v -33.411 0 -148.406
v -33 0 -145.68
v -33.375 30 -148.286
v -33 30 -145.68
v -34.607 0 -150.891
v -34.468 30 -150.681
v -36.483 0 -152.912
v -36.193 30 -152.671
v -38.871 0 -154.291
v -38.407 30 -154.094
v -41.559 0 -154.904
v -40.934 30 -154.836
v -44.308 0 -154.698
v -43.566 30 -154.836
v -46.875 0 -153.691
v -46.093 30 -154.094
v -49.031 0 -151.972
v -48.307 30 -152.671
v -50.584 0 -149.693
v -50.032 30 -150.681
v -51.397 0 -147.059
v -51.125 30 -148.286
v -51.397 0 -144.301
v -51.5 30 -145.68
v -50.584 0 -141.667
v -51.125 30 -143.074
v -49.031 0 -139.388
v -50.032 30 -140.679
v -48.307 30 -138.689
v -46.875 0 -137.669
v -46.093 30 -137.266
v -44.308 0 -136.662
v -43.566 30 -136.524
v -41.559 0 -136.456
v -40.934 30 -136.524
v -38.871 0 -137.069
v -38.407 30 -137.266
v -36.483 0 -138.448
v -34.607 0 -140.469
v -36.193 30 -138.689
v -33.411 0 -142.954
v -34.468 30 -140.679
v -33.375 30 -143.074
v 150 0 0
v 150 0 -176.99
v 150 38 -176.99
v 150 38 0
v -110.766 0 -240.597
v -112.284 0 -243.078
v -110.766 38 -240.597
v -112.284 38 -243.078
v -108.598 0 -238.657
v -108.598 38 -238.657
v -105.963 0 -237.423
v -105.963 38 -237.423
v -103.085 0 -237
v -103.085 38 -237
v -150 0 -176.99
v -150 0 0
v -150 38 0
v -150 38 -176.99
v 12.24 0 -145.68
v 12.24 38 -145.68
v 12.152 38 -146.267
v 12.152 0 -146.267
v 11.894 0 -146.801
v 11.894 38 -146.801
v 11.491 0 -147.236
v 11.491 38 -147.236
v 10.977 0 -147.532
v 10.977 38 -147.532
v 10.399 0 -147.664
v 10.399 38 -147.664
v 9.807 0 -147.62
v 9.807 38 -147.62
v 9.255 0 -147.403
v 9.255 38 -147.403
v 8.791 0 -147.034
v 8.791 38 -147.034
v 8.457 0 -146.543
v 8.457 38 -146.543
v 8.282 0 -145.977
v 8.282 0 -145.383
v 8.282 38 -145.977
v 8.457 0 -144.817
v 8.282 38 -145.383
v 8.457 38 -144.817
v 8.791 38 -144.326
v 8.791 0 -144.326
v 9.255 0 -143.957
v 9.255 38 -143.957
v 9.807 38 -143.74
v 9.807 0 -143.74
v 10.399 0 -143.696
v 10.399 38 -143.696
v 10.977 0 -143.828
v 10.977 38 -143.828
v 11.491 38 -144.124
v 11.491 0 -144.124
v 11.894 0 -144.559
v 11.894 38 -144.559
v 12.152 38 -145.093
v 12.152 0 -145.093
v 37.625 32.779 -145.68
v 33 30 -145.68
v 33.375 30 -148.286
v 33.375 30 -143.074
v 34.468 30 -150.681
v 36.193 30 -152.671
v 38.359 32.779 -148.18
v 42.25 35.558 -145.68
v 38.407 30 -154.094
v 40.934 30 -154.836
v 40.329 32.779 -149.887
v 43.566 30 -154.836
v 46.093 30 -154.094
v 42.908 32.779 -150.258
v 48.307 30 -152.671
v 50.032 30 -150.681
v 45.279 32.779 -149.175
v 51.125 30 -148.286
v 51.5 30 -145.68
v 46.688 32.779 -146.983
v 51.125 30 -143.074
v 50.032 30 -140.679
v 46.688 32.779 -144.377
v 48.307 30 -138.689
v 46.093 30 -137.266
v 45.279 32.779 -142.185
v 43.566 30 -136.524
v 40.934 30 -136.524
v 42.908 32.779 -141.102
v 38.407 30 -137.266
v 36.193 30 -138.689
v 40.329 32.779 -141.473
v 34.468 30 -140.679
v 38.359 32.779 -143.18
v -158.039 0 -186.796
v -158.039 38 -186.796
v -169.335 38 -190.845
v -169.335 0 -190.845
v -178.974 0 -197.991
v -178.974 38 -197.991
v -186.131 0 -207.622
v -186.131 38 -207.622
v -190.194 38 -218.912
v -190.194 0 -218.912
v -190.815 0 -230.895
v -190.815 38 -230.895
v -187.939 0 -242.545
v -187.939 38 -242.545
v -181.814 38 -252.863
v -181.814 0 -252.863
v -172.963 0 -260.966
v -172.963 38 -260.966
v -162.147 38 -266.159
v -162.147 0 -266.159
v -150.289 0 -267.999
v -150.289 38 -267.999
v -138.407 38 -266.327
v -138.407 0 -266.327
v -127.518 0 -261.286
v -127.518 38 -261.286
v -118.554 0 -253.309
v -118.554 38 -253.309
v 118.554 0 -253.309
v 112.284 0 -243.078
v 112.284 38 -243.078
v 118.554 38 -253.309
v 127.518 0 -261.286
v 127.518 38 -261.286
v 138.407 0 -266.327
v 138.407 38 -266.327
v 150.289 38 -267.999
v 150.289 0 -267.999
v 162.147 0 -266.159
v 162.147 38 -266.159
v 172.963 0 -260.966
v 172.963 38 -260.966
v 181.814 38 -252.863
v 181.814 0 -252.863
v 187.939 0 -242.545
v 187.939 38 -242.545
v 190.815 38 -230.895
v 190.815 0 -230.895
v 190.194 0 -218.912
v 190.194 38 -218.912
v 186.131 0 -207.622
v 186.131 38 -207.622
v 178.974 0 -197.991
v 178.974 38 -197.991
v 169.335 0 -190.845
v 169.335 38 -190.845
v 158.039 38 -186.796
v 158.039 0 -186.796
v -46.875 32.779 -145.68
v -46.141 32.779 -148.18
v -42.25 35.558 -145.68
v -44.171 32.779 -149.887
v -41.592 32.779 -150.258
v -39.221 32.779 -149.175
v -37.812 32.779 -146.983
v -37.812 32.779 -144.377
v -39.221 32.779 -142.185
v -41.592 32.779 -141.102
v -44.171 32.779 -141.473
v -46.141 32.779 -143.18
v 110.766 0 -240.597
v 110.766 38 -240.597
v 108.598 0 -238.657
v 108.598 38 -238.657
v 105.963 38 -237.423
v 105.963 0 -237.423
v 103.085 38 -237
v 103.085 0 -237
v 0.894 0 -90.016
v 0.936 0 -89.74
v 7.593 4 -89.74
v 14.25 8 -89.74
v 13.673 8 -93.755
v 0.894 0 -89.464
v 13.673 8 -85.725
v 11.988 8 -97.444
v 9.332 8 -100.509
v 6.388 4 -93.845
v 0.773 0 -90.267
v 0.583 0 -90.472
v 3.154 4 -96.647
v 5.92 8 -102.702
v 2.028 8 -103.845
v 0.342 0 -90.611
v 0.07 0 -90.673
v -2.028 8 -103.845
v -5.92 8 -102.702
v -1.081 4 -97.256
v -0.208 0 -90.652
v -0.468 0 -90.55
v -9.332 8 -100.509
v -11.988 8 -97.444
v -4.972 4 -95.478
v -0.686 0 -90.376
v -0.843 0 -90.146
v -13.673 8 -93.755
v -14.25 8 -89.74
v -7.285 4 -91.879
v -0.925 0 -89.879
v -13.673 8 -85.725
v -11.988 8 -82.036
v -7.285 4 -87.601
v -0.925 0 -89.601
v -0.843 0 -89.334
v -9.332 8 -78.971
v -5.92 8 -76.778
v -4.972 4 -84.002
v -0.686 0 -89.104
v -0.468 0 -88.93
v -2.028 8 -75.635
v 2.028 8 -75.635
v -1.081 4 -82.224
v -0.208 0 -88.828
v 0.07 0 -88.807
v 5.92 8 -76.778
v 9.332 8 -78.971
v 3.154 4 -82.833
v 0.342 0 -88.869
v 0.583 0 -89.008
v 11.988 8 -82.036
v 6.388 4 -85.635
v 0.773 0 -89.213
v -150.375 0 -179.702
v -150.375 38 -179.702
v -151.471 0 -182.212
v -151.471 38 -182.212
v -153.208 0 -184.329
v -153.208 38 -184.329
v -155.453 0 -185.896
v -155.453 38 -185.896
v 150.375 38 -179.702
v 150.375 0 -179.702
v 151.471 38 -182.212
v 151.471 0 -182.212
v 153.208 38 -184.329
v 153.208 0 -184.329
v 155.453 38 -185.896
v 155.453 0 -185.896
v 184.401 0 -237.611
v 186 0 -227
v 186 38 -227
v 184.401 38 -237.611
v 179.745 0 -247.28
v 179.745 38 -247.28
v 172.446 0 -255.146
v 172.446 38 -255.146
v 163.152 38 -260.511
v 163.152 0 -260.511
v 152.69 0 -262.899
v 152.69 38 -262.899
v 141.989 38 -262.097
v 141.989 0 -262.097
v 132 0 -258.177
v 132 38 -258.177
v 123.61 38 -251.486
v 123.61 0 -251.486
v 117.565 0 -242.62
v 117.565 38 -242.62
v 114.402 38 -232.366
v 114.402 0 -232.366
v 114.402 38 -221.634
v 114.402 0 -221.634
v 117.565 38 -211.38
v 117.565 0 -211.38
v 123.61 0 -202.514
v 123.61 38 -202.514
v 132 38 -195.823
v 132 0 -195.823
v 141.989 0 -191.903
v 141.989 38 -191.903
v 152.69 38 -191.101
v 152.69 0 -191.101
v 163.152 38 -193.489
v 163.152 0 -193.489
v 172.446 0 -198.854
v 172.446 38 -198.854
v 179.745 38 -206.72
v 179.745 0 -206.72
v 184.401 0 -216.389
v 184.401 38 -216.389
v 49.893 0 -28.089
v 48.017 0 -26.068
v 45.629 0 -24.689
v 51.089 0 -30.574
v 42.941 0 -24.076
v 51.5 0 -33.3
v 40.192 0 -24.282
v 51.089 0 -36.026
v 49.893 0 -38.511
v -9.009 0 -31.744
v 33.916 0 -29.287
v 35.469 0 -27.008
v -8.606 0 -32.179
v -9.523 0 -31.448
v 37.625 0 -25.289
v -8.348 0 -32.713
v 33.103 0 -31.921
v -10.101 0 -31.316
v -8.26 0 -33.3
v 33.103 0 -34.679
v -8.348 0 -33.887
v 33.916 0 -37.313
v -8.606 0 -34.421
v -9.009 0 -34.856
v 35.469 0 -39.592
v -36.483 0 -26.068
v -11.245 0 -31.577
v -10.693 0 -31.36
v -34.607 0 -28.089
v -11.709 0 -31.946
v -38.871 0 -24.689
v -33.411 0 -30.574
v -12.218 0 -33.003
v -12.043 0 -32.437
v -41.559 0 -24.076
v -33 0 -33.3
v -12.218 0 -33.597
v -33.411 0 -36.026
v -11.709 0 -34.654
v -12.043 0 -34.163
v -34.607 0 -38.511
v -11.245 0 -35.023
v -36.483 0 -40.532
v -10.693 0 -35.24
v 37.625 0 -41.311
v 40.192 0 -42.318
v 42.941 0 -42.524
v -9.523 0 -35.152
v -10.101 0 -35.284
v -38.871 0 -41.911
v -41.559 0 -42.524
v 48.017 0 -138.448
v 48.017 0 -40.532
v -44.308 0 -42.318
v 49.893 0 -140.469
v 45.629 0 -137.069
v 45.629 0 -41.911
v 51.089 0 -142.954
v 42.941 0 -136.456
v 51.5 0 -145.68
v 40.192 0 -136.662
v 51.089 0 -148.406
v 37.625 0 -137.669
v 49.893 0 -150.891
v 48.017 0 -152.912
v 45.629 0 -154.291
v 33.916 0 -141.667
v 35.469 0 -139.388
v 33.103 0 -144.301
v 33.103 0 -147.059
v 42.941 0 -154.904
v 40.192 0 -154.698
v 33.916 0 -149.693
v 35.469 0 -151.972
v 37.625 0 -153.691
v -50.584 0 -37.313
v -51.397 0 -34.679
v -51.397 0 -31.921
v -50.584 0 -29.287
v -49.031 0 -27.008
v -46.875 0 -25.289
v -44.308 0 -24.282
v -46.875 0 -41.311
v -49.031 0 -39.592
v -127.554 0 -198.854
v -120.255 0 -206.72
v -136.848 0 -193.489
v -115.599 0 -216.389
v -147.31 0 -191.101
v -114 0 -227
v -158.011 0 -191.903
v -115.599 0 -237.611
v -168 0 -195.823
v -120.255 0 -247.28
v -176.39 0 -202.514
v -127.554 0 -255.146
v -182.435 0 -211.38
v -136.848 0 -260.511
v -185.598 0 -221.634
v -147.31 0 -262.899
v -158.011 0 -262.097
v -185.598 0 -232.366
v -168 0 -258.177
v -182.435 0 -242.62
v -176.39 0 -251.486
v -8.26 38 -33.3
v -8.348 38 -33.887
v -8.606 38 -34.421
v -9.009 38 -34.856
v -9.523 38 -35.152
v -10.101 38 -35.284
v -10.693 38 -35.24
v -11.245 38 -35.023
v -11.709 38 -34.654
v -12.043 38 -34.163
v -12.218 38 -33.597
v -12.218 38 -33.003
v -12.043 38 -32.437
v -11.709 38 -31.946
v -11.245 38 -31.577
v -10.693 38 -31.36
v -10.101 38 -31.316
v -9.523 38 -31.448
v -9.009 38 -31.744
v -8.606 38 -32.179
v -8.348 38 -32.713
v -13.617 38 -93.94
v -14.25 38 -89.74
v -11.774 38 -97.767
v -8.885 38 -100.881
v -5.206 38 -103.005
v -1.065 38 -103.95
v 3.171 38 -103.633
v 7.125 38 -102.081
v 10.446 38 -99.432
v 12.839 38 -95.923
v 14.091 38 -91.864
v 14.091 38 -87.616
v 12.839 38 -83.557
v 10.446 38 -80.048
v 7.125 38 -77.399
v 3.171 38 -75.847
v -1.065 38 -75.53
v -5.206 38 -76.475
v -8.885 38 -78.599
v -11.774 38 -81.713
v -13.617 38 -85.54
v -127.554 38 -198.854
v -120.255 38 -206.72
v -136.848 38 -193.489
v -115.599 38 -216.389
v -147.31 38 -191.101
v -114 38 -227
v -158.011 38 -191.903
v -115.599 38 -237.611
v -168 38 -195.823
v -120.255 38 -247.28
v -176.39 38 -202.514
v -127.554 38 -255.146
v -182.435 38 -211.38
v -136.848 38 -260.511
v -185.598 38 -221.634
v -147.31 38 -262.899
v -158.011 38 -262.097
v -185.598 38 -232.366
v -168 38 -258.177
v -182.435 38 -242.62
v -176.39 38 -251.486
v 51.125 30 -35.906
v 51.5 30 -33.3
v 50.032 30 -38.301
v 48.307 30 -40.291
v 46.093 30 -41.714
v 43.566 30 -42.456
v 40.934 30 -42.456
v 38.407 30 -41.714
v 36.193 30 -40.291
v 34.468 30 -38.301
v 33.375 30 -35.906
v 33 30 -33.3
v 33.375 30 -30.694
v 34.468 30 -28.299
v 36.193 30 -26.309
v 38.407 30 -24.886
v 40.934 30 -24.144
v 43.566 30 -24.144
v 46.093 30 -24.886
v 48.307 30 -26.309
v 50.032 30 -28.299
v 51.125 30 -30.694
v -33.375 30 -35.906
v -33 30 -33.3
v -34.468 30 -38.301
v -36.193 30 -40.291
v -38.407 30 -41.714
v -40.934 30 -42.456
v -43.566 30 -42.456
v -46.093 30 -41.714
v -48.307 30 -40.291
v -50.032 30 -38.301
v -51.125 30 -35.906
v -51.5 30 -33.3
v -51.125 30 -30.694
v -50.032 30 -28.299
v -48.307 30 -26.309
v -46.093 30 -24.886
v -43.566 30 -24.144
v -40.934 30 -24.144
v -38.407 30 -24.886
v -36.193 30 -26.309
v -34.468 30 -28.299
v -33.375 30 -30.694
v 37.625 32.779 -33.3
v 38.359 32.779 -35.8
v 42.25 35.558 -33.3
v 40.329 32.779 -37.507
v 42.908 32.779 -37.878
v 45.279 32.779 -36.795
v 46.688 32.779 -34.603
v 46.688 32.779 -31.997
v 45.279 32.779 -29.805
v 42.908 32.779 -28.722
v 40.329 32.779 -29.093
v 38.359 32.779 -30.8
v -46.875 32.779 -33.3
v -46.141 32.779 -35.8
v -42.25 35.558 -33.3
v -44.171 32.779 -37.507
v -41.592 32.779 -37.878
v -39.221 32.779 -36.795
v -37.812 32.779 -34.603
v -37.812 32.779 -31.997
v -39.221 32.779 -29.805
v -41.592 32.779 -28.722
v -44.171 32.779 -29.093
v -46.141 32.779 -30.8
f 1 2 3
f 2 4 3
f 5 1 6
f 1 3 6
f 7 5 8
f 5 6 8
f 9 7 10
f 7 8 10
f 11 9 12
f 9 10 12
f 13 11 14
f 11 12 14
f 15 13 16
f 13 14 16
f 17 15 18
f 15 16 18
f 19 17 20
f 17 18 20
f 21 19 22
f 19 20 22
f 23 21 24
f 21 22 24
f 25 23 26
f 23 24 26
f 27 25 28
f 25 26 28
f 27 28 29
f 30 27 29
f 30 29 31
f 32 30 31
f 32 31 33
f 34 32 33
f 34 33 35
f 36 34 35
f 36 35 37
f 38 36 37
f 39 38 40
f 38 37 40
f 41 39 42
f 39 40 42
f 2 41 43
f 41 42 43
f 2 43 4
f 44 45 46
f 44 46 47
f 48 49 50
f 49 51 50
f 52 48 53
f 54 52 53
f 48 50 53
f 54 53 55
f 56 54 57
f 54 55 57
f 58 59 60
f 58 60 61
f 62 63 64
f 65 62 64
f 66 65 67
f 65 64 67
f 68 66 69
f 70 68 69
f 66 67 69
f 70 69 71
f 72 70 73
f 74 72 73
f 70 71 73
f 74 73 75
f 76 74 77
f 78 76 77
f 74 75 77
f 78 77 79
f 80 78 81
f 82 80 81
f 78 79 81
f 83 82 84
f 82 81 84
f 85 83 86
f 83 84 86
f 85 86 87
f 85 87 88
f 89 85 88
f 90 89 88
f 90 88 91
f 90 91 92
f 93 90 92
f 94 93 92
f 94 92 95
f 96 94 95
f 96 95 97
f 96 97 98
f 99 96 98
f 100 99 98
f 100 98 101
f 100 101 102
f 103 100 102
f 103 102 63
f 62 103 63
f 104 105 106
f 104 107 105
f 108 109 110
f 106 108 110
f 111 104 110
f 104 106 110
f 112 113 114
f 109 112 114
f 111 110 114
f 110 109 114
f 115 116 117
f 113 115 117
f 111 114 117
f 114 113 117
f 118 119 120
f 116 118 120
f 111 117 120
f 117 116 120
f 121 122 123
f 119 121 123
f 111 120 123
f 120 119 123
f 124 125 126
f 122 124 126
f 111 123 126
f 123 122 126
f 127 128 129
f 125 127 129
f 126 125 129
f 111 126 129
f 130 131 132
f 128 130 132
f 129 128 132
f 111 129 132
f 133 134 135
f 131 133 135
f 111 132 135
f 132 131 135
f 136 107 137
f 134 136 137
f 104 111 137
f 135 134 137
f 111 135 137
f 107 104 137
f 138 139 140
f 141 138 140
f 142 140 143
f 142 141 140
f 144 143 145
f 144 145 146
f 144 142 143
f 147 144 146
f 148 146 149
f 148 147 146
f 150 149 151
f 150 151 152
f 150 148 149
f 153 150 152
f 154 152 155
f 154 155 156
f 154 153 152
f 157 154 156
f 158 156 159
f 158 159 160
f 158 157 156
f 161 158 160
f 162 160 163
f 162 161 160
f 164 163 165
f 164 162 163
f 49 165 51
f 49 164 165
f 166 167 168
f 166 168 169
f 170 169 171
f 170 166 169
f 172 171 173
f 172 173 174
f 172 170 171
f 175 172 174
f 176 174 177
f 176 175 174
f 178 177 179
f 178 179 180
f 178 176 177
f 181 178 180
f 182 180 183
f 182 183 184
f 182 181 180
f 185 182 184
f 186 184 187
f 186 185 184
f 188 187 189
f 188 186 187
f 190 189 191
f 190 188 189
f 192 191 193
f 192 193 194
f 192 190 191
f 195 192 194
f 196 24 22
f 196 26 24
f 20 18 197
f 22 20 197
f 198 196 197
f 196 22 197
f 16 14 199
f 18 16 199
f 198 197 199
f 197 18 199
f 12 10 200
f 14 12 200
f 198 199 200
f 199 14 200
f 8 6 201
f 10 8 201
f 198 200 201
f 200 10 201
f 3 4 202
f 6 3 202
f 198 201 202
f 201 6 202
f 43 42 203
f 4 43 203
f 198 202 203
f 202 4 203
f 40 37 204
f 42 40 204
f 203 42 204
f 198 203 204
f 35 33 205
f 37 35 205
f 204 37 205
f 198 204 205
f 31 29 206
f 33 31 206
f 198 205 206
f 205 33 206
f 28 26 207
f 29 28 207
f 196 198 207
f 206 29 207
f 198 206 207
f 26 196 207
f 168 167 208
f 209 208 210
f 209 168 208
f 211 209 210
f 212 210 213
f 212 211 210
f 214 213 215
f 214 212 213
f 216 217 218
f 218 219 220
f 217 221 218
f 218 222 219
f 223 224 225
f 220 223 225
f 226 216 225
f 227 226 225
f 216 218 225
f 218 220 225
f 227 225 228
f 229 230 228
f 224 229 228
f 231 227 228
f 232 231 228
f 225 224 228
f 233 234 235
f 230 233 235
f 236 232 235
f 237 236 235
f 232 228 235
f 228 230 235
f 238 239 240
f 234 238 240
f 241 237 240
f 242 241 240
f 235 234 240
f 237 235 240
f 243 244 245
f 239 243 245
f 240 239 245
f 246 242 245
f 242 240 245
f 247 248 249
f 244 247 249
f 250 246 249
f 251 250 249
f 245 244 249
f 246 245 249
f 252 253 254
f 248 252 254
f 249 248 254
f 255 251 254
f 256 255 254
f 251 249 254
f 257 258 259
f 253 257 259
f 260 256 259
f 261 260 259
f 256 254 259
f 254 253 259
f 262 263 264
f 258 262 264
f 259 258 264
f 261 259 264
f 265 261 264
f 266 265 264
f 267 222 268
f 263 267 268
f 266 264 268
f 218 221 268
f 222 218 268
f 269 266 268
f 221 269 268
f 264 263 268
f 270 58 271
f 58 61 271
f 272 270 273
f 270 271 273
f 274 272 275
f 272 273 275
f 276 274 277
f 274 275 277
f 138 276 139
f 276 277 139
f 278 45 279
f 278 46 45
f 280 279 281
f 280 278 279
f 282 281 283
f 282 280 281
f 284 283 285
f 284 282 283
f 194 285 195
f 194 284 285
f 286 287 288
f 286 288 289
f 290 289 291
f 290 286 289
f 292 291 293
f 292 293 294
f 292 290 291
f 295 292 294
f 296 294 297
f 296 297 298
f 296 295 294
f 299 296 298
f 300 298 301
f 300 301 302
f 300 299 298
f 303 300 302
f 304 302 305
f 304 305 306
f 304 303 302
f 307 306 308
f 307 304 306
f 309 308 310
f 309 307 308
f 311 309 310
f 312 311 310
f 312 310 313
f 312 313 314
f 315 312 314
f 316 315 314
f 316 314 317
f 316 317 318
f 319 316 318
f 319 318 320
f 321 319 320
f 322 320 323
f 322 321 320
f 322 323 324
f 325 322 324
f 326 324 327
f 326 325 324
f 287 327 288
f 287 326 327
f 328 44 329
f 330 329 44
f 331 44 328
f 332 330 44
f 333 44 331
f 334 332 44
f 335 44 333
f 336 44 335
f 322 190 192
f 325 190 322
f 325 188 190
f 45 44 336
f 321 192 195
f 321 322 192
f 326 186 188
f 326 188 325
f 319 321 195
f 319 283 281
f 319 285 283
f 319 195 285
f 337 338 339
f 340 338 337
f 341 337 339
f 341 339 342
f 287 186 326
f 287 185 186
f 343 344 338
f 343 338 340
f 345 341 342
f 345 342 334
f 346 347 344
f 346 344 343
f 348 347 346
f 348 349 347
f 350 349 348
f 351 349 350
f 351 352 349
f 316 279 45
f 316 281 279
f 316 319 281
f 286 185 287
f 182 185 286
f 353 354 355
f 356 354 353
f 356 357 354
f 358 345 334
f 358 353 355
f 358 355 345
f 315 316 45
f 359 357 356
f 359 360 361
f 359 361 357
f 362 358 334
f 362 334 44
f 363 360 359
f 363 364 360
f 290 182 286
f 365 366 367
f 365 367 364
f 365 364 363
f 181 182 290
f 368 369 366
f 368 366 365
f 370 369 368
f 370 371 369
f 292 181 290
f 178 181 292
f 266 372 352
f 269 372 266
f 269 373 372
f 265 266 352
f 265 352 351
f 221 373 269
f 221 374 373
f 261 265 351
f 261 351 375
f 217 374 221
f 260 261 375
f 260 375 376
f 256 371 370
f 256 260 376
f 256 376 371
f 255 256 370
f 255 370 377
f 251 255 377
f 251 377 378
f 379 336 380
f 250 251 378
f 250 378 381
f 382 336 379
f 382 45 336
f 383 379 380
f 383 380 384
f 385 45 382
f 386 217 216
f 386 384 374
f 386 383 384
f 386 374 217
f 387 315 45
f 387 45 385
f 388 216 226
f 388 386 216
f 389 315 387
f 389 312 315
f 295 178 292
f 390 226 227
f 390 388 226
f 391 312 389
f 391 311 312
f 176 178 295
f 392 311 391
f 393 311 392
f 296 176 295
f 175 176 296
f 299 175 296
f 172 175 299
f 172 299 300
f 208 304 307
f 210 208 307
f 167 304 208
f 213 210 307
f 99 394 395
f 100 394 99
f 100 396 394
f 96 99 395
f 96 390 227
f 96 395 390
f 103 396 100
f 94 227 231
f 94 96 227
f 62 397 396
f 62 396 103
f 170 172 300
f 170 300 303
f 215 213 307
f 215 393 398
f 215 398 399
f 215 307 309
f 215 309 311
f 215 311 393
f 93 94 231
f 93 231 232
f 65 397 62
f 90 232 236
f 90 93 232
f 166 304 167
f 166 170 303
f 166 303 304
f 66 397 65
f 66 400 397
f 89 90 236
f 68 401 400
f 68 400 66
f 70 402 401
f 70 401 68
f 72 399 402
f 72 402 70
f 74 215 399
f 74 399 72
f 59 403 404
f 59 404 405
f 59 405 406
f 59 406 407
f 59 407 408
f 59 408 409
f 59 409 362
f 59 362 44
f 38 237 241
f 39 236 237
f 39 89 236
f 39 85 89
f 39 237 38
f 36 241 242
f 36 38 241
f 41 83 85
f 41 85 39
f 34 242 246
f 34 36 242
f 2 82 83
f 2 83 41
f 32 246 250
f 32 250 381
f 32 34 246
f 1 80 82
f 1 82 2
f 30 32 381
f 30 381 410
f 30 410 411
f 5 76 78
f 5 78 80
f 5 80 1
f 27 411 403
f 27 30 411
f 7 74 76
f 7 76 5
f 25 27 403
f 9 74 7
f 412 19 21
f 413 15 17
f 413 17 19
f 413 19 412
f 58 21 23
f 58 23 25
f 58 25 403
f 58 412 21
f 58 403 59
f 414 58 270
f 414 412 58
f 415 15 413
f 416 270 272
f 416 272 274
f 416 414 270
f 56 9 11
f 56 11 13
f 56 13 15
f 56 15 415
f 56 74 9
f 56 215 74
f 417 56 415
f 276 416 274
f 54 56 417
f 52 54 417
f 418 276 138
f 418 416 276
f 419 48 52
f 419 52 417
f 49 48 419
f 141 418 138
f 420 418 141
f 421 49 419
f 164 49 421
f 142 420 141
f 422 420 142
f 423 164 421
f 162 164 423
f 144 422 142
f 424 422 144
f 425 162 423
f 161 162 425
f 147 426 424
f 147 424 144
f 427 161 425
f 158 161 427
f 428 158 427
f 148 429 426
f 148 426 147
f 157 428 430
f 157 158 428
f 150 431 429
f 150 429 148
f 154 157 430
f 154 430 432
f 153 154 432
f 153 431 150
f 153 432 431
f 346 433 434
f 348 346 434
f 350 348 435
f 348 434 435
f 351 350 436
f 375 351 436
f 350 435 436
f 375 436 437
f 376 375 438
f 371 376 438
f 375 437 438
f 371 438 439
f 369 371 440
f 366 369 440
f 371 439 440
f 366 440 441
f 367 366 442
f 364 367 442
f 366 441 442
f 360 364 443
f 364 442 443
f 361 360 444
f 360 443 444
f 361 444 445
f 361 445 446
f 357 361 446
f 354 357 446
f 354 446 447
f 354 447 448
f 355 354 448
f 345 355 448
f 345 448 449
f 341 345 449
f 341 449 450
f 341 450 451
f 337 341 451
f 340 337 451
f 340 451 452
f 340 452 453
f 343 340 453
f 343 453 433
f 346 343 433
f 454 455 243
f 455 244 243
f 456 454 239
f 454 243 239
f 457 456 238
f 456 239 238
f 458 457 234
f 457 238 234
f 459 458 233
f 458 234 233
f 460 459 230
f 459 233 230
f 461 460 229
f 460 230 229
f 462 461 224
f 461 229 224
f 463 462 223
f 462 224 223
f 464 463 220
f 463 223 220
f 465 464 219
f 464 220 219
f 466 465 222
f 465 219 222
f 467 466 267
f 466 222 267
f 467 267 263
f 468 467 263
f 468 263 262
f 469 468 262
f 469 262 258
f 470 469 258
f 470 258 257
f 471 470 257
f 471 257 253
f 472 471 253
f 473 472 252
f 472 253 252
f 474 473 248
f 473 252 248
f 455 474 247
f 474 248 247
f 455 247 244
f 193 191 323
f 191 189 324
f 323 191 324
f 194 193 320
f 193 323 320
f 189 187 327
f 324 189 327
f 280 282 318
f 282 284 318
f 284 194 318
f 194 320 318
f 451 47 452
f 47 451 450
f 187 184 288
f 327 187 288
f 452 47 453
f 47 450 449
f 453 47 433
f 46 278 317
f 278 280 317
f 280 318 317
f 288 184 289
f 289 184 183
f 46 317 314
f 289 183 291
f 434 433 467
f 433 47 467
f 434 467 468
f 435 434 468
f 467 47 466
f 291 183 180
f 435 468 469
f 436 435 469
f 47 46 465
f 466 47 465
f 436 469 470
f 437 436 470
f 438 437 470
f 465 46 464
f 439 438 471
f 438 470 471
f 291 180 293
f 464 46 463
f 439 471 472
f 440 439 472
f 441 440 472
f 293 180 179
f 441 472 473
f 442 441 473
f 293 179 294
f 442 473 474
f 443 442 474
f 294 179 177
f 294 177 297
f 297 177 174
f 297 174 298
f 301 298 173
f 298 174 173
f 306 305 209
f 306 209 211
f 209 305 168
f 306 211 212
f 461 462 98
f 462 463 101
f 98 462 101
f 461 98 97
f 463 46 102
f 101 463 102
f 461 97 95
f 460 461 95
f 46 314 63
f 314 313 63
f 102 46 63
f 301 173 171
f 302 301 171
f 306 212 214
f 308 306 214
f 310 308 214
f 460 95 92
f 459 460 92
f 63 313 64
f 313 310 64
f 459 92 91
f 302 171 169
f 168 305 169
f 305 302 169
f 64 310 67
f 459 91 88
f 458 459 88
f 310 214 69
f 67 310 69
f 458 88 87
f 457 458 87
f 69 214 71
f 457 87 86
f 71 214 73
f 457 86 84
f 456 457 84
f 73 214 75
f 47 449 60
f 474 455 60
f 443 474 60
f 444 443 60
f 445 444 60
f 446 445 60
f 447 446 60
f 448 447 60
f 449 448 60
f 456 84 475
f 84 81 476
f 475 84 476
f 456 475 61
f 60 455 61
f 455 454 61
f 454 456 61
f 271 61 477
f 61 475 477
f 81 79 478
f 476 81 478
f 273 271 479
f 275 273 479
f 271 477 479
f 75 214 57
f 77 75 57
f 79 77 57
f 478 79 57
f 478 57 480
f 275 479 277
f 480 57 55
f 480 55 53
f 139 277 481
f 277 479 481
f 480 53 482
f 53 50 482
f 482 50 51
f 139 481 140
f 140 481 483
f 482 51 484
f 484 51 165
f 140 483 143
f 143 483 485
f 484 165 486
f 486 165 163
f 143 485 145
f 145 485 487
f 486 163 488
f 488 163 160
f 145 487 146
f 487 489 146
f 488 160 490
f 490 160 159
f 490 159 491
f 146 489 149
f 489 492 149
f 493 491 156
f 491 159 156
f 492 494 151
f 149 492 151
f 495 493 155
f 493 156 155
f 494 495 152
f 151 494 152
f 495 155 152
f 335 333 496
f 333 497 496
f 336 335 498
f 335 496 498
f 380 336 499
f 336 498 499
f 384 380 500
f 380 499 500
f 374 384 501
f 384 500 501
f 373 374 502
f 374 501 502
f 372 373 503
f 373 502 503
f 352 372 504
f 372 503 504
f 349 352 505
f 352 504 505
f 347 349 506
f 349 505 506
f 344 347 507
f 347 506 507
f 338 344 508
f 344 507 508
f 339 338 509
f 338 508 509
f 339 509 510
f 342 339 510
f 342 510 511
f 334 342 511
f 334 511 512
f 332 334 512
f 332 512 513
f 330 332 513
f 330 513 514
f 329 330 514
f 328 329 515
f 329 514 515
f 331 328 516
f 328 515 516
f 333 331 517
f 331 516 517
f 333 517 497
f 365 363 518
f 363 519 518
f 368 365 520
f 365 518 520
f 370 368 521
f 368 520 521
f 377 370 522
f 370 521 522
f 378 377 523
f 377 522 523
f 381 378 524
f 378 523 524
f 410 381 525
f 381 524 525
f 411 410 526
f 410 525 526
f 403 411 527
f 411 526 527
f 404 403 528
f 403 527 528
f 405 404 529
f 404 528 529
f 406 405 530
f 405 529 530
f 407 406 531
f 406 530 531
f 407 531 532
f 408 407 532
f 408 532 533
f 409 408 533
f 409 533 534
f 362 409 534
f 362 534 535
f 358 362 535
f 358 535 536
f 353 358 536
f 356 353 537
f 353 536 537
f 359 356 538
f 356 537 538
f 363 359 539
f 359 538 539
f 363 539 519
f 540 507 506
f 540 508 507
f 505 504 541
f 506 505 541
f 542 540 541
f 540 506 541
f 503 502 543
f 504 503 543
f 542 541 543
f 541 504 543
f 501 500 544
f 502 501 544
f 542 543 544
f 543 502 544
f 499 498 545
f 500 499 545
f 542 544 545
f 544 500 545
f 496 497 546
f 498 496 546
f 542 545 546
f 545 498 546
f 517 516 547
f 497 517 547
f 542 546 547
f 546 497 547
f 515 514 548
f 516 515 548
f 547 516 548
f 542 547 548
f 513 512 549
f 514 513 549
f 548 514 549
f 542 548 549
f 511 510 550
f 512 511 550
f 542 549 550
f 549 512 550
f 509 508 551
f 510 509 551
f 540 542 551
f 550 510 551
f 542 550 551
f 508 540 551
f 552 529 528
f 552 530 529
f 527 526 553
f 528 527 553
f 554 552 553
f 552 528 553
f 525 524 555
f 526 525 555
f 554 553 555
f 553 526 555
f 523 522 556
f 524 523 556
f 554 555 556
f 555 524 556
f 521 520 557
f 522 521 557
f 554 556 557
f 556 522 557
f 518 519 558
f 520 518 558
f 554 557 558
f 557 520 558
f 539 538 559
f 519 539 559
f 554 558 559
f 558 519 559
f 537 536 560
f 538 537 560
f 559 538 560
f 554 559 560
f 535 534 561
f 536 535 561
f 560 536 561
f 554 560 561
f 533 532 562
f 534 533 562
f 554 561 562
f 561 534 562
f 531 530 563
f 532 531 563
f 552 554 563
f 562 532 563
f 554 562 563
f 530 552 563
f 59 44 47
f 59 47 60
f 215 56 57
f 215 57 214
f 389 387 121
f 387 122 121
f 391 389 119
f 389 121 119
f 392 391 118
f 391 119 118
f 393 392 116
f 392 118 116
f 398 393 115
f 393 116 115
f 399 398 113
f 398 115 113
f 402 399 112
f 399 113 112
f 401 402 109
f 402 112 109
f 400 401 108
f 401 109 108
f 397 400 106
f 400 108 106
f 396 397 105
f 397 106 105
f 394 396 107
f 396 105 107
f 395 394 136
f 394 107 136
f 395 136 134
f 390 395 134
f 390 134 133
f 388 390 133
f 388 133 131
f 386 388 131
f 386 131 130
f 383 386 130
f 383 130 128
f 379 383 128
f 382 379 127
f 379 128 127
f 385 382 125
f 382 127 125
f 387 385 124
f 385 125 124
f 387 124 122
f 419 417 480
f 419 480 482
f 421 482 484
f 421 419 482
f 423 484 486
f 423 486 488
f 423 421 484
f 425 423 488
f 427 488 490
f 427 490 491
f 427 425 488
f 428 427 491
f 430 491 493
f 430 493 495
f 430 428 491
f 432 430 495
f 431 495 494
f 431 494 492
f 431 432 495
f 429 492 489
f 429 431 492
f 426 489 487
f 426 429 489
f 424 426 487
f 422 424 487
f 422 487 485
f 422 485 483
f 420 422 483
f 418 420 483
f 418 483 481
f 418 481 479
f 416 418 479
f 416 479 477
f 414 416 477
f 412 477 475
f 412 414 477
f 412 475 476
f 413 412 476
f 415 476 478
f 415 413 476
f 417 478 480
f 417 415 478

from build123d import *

# Parameters (mm, degrees)
SKETCH1_R                  = 36
BOSS_EXTRUDE1_DEPTH        = 38
FILLET1_R                  = 10
SKETCH2_R                  = 1.99
CUT_EXTRUDE1_DEPTH         = 39
M20X1_5_TAPPED_HOLE1_D     = 18.5
M20X1_5_TAPPED_HOLE1_DEPTH = 30
M20X1_5_TAPPED_HOLE1_TIP   = 5.557960726
M30X1_5_TAPPED_HOLE1_D     = 28.5
M30X1_5_TAPPED_HOLE1_DEPTH = 30
M30X1_5_TAPPED_HOLE1_TIP   = 8.562263821


with BuildPart() as part:
    # Sketch1 → Boss-Extrude1 (new body)
    with BuildSketch(Plane(origin=(0, 0, 0), x_dir=(1, 0, 0), z_dir=(0, 1, 0))):
        with BuildLine():
            Line((150, 0), (-150, 0))
            Line((-150, 0), (-150, 186))
            ThreePointArc((-150, 186), (-182.334192428, 252.209125332), (-110.238209296, 237))
            Line((-110.238209296, 237), (110.238209296, 237))
            ThreePointArc((110.238209296, 237), (182.334192428, 252.209125332), (150, 186))
            Line((150, 186), (150, 0))
        make_face()
        with Locations((-150, 227)):
            Circle(SKETCH1_R, mode=Mode.SUBTRACT)
        with Locations((150, 227)):
            Circle(SKETCH1_R, mode=Mode.SUBTRACT)
    extrude(amount=BOSS_EXTRUDE1_DEPTH)

    # Fillet1
    fillet1_edges = [part.edges().sort_by_distance(p)[0] for p in [
        (-150, 19, -186),
        (-110.238209296, 19, -237),
        (110.238209296, 19, -237),
        (150, 19, -186),
    ]]
    fillet(fillet1_edges, radius=FILLET1_R)

    # Sketch2 → Cut-Extrude1 (cut, through all)
    with BuildSketch(Plane(origin=(0, 38, 0), x_dir=(1, 0, 0), z_dir=(0, 1, 0))):
        with Locations((-10.25, 33.3)):
            Circle(SKETCH2_R)
        with Locations((10.25, 145.68)):
            Circle(SKETCH2_R)
    extrude(amount=-CUT_EXTRUDE1_DEPTH, mode=Mode.SUBTRACT)

    # M20x1.5 Tapped Hole1
    with Locations(Plane(origin=(0, 0, 0), x_dir=(-1, 0, 0), z_dir=(0, -1, 0))):
        with Locations((42.25, 145.68), (-42.25, 145.68), (42.25, 33.3), (-42.25, 33.3)):
            Hole(M20X1_5_TAPPED_HOLE1_D / 2, depth=M20X1_5_TAPPED_HOLE1_DEPTH)
            with Locations((0, 0, -(M20X1_5_TAPPED_HOLE1_DEPTH + M20X1_5_TAPPED_HOLE1_TIP / 2))):  # 118° drill point
                Cone(0, M20X1_5_TAPPED_HOLE1_D / 2, M20X1_5_TAPPED_HOLE1_TIP, mode=Mode.SUBTRACT)

    # M30x1.5 Tapped Hole1
    with Locations(Plane(origin=(0, 38, 0), x_dir=(1, 0, 0), z_dir=(0, 1, 0))):
        with Locations((0, 89.74)):
            Hole(M30X1_5_TAPPED_HOLE1_D / 2, depth=M30X1_5_TAPPED_HOLE1_DEPTH)
            with Locations((0, 0, -(M30X1_5_TAPPED_HOLE1_DEPTH + M30X1_5_TAPPED_HOLE1_TIP / 2))):  # 118° drill point
                Cone(0, M30X1_5_TAPPED_HOLE1_D / 2, M30X1_5_TAPPED_HOLE1_TIP, mode=Mode.SUBTRACT)


solid = part.part
